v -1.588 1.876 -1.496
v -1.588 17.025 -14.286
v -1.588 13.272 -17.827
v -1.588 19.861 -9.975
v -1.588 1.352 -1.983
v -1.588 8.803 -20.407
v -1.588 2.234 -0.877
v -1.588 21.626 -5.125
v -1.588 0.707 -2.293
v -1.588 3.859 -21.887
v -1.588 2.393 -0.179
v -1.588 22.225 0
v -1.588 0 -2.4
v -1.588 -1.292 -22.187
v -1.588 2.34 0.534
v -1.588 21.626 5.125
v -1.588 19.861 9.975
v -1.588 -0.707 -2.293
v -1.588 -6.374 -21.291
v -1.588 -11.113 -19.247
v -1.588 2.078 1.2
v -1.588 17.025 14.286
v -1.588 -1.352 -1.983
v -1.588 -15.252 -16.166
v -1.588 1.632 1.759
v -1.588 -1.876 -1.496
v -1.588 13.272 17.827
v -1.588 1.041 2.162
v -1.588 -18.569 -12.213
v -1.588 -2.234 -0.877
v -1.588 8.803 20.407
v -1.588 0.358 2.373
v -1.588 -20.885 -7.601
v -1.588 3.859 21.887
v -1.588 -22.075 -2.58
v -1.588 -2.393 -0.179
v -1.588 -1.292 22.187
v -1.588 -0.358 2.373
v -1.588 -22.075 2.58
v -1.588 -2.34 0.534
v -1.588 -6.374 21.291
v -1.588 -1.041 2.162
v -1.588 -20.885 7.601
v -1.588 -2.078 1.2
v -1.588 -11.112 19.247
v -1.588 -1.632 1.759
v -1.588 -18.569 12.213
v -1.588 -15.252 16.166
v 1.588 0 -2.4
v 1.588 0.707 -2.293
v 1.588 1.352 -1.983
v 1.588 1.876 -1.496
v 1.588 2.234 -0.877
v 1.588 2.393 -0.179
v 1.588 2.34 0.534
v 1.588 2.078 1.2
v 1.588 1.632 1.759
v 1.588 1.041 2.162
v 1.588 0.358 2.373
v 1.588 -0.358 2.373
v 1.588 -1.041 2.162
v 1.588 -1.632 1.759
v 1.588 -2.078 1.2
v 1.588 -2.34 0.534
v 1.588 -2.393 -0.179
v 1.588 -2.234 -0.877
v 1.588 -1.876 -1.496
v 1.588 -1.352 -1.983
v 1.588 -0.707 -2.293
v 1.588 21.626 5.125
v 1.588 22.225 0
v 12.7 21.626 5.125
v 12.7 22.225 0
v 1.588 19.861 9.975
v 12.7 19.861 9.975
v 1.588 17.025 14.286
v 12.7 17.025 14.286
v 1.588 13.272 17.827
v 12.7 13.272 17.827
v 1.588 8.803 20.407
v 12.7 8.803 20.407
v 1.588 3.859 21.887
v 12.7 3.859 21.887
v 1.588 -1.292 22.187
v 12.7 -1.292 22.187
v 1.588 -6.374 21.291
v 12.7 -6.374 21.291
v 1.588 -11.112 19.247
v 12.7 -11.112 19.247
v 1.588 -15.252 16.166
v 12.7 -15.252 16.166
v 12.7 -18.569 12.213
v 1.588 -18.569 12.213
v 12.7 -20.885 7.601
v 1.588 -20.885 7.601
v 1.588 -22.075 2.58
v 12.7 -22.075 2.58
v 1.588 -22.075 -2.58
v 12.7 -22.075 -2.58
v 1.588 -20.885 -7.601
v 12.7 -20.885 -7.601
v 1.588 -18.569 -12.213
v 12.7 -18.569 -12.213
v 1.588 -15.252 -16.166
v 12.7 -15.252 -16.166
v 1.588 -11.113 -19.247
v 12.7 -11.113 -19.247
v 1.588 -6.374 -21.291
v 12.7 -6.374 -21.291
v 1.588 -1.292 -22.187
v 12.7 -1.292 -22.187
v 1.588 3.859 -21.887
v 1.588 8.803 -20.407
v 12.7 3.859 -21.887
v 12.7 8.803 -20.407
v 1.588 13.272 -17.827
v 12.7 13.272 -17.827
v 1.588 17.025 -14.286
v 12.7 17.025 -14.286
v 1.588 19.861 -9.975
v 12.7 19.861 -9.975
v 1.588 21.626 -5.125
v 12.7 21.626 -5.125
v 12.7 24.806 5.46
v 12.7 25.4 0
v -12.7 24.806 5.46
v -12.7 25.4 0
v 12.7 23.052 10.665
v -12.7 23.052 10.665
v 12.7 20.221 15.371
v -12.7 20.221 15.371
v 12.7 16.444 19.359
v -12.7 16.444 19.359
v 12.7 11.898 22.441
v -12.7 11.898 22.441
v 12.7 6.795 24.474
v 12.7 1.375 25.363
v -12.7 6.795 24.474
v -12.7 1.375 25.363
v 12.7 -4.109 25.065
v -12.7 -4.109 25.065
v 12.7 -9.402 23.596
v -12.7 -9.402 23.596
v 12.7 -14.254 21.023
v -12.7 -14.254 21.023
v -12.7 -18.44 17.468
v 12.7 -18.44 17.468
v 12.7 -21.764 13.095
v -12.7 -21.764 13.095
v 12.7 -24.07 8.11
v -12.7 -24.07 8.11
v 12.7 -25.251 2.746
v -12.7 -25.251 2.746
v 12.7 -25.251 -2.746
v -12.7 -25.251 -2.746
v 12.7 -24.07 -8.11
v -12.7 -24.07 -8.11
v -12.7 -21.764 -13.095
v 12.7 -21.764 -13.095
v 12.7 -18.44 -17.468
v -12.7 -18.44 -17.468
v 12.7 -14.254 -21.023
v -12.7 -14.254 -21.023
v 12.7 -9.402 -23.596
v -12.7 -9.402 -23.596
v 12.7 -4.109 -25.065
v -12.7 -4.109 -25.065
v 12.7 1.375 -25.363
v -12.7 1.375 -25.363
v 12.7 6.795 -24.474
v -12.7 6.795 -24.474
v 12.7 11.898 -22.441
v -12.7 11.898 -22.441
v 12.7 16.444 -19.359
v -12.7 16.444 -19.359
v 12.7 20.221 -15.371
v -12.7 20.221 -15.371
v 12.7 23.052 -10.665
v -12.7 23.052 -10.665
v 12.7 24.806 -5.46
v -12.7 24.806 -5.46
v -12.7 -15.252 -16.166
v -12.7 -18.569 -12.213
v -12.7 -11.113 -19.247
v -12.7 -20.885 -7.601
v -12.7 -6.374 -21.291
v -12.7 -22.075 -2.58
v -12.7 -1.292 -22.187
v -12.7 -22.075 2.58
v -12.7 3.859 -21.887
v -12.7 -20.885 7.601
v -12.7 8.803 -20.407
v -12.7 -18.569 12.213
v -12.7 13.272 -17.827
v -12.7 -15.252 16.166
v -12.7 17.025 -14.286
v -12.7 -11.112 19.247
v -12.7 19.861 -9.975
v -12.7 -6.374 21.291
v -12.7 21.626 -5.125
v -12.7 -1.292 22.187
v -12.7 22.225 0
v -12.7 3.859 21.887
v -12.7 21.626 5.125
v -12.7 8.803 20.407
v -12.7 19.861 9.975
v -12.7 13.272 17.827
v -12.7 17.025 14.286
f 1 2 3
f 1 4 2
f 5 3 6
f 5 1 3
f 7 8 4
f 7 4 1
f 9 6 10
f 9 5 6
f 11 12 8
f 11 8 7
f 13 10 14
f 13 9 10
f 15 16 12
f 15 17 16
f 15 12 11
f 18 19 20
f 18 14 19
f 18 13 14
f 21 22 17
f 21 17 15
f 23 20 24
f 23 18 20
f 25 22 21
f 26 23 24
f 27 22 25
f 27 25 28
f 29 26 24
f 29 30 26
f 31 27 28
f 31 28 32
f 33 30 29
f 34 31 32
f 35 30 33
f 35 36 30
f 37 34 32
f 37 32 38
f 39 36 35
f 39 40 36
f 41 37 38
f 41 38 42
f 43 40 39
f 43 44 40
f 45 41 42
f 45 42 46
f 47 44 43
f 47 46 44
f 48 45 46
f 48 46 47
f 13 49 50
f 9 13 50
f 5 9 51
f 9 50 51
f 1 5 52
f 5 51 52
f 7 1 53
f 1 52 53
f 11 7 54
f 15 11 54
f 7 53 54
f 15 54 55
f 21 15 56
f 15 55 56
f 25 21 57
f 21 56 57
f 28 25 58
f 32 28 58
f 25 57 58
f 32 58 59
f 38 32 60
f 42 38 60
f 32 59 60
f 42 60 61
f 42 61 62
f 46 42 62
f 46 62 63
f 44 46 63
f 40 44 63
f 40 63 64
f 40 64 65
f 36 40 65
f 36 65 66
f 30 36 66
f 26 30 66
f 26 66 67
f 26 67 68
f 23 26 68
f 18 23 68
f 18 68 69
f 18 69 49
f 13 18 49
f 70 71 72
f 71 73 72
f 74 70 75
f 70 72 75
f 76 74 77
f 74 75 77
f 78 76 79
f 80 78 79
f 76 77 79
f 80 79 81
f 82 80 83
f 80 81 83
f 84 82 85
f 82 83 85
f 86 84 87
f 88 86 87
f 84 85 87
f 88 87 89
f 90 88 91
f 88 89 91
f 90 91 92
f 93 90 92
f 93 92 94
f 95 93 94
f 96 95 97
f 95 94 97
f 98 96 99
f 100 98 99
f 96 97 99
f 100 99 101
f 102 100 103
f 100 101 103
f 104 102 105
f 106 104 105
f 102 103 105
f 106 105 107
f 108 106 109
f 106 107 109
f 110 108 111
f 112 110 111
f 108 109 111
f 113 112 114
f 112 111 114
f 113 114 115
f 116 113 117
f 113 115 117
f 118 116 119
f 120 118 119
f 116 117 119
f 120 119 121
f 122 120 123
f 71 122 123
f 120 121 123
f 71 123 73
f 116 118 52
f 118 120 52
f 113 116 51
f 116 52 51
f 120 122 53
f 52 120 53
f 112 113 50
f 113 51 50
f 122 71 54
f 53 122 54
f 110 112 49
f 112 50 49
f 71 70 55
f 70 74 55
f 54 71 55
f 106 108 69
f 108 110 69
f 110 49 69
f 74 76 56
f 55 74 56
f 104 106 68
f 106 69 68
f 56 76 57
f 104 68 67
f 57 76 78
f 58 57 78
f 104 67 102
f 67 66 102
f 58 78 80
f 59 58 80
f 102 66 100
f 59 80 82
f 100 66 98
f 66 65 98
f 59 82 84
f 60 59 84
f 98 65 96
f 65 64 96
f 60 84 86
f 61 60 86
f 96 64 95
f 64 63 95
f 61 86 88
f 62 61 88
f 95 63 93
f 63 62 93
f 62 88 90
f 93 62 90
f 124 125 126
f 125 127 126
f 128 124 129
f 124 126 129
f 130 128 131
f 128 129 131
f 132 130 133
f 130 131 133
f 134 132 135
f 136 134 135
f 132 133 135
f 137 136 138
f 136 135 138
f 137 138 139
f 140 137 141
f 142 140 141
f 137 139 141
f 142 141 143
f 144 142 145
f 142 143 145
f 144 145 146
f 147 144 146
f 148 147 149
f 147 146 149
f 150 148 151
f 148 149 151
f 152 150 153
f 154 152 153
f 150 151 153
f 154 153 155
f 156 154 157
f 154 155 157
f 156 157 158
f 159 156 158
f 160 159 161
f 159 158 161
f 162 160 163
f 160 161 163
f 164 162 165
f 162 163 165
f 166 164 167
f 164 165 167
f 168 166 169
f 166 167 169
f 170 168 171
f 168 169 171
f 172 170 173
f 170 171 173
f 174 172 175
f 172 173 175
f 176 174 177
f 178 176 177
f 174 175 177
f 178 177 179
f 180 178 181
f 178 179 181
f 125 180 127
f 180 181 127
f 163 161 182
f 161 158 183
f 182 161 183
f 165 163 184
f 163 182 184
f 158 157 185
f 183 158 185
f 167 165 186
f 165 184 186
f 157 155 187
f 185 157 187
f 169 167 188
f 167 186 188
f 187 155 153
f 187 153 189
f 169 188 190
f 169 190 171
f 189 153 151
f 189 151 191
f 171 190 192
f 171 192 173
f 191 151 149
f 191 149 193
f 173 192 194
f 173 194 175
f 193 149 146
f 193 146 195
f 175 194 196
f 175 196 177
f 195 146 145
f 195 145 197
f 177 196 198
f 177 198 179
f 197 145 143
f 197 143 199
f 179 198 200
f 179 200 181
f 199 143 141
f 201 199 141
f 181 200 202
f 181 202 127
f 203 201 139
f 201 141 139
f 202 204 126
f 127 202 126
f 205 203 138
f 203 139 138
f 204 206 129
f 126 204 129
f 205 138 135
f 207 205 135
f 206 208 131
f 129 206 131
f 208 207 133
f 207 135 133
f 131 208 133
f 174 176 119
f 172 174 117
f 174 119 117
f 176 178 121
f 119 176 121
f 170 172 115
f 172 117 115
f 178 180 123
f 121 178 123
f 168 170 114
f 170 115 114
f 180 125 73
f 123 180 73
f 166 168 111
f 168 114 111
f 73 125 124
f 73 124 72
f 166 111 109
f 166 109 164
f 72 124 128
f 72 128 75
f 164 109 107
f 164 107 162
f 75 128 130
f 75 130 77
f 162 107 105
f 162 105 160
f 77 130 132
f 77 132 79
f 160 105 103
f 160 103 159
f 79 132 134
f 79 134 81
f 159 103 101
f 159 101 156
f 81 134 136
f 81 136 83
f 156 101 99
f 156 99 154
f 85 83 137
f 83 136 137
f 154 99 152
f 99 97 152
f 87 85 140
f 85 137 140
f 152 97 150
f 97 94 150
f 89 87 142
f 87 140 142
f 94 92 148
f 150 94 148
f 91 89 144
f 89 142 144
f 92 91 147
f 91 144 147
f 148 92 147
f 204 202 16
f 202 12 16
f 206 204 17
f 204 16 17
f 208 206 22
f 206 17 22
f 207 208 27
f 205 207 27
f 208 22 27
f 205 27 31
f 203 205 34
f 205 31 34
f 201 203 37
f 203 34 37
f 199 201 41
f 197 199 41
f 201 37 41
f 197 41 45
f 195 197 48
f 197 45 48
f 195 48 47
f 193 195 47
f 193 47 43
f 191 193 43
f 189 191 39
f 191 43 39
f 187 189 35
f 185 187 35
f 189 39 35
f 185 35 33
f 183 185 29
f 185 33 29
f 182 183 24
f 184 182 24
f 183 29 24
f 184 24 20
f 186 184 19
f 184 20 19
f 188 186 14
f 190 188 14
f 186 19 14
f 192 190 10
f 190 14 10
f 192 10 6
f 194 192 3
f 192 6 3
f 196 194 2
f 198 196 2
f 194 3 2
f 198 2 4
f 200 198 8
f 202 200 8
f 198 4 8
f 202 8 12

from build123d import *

# Parameters (mm, degrees)
SKETCH1_W            = 1.5875
SKETCH1_H            = 22.225
M4_CLEARANCE_HOLE1_D = 4.8


with BuildPart() as part:
    # Sketch1 → Revolve1 (revolve)
    with BuildSketch(Plane.XY):
        Polygon((0, 25.4), (0, 22.225), (1.5875, 22.225), (12.7, 22.225), (12.7, 25.4), align=None)
        Polygon((-1.5875, 22.225), (0, 22.225), (0, 25.4), (-12.7, 25.4), (-12.7, 22.225), align=None)
        with Locations((-0.79375, 11.1125)):
            Rectangle(SKETCH1_W, SKETCH1_H)
        with Locations((0.79375, 11.1125)):
            Rectangle(SKETCH1_W, SKETCH1_H)
    revolve(axis=Axis((0, 0, 0), (1, 0, 0)))

    # M4 Clearance Hole1 (through all)
    with Locations(Plane.ZY.offset(1.5875)):
        with Locations((0, 0)):
            Hole(M4_CLEARANCE_HOLE1_D / 2)


solid = part.part
